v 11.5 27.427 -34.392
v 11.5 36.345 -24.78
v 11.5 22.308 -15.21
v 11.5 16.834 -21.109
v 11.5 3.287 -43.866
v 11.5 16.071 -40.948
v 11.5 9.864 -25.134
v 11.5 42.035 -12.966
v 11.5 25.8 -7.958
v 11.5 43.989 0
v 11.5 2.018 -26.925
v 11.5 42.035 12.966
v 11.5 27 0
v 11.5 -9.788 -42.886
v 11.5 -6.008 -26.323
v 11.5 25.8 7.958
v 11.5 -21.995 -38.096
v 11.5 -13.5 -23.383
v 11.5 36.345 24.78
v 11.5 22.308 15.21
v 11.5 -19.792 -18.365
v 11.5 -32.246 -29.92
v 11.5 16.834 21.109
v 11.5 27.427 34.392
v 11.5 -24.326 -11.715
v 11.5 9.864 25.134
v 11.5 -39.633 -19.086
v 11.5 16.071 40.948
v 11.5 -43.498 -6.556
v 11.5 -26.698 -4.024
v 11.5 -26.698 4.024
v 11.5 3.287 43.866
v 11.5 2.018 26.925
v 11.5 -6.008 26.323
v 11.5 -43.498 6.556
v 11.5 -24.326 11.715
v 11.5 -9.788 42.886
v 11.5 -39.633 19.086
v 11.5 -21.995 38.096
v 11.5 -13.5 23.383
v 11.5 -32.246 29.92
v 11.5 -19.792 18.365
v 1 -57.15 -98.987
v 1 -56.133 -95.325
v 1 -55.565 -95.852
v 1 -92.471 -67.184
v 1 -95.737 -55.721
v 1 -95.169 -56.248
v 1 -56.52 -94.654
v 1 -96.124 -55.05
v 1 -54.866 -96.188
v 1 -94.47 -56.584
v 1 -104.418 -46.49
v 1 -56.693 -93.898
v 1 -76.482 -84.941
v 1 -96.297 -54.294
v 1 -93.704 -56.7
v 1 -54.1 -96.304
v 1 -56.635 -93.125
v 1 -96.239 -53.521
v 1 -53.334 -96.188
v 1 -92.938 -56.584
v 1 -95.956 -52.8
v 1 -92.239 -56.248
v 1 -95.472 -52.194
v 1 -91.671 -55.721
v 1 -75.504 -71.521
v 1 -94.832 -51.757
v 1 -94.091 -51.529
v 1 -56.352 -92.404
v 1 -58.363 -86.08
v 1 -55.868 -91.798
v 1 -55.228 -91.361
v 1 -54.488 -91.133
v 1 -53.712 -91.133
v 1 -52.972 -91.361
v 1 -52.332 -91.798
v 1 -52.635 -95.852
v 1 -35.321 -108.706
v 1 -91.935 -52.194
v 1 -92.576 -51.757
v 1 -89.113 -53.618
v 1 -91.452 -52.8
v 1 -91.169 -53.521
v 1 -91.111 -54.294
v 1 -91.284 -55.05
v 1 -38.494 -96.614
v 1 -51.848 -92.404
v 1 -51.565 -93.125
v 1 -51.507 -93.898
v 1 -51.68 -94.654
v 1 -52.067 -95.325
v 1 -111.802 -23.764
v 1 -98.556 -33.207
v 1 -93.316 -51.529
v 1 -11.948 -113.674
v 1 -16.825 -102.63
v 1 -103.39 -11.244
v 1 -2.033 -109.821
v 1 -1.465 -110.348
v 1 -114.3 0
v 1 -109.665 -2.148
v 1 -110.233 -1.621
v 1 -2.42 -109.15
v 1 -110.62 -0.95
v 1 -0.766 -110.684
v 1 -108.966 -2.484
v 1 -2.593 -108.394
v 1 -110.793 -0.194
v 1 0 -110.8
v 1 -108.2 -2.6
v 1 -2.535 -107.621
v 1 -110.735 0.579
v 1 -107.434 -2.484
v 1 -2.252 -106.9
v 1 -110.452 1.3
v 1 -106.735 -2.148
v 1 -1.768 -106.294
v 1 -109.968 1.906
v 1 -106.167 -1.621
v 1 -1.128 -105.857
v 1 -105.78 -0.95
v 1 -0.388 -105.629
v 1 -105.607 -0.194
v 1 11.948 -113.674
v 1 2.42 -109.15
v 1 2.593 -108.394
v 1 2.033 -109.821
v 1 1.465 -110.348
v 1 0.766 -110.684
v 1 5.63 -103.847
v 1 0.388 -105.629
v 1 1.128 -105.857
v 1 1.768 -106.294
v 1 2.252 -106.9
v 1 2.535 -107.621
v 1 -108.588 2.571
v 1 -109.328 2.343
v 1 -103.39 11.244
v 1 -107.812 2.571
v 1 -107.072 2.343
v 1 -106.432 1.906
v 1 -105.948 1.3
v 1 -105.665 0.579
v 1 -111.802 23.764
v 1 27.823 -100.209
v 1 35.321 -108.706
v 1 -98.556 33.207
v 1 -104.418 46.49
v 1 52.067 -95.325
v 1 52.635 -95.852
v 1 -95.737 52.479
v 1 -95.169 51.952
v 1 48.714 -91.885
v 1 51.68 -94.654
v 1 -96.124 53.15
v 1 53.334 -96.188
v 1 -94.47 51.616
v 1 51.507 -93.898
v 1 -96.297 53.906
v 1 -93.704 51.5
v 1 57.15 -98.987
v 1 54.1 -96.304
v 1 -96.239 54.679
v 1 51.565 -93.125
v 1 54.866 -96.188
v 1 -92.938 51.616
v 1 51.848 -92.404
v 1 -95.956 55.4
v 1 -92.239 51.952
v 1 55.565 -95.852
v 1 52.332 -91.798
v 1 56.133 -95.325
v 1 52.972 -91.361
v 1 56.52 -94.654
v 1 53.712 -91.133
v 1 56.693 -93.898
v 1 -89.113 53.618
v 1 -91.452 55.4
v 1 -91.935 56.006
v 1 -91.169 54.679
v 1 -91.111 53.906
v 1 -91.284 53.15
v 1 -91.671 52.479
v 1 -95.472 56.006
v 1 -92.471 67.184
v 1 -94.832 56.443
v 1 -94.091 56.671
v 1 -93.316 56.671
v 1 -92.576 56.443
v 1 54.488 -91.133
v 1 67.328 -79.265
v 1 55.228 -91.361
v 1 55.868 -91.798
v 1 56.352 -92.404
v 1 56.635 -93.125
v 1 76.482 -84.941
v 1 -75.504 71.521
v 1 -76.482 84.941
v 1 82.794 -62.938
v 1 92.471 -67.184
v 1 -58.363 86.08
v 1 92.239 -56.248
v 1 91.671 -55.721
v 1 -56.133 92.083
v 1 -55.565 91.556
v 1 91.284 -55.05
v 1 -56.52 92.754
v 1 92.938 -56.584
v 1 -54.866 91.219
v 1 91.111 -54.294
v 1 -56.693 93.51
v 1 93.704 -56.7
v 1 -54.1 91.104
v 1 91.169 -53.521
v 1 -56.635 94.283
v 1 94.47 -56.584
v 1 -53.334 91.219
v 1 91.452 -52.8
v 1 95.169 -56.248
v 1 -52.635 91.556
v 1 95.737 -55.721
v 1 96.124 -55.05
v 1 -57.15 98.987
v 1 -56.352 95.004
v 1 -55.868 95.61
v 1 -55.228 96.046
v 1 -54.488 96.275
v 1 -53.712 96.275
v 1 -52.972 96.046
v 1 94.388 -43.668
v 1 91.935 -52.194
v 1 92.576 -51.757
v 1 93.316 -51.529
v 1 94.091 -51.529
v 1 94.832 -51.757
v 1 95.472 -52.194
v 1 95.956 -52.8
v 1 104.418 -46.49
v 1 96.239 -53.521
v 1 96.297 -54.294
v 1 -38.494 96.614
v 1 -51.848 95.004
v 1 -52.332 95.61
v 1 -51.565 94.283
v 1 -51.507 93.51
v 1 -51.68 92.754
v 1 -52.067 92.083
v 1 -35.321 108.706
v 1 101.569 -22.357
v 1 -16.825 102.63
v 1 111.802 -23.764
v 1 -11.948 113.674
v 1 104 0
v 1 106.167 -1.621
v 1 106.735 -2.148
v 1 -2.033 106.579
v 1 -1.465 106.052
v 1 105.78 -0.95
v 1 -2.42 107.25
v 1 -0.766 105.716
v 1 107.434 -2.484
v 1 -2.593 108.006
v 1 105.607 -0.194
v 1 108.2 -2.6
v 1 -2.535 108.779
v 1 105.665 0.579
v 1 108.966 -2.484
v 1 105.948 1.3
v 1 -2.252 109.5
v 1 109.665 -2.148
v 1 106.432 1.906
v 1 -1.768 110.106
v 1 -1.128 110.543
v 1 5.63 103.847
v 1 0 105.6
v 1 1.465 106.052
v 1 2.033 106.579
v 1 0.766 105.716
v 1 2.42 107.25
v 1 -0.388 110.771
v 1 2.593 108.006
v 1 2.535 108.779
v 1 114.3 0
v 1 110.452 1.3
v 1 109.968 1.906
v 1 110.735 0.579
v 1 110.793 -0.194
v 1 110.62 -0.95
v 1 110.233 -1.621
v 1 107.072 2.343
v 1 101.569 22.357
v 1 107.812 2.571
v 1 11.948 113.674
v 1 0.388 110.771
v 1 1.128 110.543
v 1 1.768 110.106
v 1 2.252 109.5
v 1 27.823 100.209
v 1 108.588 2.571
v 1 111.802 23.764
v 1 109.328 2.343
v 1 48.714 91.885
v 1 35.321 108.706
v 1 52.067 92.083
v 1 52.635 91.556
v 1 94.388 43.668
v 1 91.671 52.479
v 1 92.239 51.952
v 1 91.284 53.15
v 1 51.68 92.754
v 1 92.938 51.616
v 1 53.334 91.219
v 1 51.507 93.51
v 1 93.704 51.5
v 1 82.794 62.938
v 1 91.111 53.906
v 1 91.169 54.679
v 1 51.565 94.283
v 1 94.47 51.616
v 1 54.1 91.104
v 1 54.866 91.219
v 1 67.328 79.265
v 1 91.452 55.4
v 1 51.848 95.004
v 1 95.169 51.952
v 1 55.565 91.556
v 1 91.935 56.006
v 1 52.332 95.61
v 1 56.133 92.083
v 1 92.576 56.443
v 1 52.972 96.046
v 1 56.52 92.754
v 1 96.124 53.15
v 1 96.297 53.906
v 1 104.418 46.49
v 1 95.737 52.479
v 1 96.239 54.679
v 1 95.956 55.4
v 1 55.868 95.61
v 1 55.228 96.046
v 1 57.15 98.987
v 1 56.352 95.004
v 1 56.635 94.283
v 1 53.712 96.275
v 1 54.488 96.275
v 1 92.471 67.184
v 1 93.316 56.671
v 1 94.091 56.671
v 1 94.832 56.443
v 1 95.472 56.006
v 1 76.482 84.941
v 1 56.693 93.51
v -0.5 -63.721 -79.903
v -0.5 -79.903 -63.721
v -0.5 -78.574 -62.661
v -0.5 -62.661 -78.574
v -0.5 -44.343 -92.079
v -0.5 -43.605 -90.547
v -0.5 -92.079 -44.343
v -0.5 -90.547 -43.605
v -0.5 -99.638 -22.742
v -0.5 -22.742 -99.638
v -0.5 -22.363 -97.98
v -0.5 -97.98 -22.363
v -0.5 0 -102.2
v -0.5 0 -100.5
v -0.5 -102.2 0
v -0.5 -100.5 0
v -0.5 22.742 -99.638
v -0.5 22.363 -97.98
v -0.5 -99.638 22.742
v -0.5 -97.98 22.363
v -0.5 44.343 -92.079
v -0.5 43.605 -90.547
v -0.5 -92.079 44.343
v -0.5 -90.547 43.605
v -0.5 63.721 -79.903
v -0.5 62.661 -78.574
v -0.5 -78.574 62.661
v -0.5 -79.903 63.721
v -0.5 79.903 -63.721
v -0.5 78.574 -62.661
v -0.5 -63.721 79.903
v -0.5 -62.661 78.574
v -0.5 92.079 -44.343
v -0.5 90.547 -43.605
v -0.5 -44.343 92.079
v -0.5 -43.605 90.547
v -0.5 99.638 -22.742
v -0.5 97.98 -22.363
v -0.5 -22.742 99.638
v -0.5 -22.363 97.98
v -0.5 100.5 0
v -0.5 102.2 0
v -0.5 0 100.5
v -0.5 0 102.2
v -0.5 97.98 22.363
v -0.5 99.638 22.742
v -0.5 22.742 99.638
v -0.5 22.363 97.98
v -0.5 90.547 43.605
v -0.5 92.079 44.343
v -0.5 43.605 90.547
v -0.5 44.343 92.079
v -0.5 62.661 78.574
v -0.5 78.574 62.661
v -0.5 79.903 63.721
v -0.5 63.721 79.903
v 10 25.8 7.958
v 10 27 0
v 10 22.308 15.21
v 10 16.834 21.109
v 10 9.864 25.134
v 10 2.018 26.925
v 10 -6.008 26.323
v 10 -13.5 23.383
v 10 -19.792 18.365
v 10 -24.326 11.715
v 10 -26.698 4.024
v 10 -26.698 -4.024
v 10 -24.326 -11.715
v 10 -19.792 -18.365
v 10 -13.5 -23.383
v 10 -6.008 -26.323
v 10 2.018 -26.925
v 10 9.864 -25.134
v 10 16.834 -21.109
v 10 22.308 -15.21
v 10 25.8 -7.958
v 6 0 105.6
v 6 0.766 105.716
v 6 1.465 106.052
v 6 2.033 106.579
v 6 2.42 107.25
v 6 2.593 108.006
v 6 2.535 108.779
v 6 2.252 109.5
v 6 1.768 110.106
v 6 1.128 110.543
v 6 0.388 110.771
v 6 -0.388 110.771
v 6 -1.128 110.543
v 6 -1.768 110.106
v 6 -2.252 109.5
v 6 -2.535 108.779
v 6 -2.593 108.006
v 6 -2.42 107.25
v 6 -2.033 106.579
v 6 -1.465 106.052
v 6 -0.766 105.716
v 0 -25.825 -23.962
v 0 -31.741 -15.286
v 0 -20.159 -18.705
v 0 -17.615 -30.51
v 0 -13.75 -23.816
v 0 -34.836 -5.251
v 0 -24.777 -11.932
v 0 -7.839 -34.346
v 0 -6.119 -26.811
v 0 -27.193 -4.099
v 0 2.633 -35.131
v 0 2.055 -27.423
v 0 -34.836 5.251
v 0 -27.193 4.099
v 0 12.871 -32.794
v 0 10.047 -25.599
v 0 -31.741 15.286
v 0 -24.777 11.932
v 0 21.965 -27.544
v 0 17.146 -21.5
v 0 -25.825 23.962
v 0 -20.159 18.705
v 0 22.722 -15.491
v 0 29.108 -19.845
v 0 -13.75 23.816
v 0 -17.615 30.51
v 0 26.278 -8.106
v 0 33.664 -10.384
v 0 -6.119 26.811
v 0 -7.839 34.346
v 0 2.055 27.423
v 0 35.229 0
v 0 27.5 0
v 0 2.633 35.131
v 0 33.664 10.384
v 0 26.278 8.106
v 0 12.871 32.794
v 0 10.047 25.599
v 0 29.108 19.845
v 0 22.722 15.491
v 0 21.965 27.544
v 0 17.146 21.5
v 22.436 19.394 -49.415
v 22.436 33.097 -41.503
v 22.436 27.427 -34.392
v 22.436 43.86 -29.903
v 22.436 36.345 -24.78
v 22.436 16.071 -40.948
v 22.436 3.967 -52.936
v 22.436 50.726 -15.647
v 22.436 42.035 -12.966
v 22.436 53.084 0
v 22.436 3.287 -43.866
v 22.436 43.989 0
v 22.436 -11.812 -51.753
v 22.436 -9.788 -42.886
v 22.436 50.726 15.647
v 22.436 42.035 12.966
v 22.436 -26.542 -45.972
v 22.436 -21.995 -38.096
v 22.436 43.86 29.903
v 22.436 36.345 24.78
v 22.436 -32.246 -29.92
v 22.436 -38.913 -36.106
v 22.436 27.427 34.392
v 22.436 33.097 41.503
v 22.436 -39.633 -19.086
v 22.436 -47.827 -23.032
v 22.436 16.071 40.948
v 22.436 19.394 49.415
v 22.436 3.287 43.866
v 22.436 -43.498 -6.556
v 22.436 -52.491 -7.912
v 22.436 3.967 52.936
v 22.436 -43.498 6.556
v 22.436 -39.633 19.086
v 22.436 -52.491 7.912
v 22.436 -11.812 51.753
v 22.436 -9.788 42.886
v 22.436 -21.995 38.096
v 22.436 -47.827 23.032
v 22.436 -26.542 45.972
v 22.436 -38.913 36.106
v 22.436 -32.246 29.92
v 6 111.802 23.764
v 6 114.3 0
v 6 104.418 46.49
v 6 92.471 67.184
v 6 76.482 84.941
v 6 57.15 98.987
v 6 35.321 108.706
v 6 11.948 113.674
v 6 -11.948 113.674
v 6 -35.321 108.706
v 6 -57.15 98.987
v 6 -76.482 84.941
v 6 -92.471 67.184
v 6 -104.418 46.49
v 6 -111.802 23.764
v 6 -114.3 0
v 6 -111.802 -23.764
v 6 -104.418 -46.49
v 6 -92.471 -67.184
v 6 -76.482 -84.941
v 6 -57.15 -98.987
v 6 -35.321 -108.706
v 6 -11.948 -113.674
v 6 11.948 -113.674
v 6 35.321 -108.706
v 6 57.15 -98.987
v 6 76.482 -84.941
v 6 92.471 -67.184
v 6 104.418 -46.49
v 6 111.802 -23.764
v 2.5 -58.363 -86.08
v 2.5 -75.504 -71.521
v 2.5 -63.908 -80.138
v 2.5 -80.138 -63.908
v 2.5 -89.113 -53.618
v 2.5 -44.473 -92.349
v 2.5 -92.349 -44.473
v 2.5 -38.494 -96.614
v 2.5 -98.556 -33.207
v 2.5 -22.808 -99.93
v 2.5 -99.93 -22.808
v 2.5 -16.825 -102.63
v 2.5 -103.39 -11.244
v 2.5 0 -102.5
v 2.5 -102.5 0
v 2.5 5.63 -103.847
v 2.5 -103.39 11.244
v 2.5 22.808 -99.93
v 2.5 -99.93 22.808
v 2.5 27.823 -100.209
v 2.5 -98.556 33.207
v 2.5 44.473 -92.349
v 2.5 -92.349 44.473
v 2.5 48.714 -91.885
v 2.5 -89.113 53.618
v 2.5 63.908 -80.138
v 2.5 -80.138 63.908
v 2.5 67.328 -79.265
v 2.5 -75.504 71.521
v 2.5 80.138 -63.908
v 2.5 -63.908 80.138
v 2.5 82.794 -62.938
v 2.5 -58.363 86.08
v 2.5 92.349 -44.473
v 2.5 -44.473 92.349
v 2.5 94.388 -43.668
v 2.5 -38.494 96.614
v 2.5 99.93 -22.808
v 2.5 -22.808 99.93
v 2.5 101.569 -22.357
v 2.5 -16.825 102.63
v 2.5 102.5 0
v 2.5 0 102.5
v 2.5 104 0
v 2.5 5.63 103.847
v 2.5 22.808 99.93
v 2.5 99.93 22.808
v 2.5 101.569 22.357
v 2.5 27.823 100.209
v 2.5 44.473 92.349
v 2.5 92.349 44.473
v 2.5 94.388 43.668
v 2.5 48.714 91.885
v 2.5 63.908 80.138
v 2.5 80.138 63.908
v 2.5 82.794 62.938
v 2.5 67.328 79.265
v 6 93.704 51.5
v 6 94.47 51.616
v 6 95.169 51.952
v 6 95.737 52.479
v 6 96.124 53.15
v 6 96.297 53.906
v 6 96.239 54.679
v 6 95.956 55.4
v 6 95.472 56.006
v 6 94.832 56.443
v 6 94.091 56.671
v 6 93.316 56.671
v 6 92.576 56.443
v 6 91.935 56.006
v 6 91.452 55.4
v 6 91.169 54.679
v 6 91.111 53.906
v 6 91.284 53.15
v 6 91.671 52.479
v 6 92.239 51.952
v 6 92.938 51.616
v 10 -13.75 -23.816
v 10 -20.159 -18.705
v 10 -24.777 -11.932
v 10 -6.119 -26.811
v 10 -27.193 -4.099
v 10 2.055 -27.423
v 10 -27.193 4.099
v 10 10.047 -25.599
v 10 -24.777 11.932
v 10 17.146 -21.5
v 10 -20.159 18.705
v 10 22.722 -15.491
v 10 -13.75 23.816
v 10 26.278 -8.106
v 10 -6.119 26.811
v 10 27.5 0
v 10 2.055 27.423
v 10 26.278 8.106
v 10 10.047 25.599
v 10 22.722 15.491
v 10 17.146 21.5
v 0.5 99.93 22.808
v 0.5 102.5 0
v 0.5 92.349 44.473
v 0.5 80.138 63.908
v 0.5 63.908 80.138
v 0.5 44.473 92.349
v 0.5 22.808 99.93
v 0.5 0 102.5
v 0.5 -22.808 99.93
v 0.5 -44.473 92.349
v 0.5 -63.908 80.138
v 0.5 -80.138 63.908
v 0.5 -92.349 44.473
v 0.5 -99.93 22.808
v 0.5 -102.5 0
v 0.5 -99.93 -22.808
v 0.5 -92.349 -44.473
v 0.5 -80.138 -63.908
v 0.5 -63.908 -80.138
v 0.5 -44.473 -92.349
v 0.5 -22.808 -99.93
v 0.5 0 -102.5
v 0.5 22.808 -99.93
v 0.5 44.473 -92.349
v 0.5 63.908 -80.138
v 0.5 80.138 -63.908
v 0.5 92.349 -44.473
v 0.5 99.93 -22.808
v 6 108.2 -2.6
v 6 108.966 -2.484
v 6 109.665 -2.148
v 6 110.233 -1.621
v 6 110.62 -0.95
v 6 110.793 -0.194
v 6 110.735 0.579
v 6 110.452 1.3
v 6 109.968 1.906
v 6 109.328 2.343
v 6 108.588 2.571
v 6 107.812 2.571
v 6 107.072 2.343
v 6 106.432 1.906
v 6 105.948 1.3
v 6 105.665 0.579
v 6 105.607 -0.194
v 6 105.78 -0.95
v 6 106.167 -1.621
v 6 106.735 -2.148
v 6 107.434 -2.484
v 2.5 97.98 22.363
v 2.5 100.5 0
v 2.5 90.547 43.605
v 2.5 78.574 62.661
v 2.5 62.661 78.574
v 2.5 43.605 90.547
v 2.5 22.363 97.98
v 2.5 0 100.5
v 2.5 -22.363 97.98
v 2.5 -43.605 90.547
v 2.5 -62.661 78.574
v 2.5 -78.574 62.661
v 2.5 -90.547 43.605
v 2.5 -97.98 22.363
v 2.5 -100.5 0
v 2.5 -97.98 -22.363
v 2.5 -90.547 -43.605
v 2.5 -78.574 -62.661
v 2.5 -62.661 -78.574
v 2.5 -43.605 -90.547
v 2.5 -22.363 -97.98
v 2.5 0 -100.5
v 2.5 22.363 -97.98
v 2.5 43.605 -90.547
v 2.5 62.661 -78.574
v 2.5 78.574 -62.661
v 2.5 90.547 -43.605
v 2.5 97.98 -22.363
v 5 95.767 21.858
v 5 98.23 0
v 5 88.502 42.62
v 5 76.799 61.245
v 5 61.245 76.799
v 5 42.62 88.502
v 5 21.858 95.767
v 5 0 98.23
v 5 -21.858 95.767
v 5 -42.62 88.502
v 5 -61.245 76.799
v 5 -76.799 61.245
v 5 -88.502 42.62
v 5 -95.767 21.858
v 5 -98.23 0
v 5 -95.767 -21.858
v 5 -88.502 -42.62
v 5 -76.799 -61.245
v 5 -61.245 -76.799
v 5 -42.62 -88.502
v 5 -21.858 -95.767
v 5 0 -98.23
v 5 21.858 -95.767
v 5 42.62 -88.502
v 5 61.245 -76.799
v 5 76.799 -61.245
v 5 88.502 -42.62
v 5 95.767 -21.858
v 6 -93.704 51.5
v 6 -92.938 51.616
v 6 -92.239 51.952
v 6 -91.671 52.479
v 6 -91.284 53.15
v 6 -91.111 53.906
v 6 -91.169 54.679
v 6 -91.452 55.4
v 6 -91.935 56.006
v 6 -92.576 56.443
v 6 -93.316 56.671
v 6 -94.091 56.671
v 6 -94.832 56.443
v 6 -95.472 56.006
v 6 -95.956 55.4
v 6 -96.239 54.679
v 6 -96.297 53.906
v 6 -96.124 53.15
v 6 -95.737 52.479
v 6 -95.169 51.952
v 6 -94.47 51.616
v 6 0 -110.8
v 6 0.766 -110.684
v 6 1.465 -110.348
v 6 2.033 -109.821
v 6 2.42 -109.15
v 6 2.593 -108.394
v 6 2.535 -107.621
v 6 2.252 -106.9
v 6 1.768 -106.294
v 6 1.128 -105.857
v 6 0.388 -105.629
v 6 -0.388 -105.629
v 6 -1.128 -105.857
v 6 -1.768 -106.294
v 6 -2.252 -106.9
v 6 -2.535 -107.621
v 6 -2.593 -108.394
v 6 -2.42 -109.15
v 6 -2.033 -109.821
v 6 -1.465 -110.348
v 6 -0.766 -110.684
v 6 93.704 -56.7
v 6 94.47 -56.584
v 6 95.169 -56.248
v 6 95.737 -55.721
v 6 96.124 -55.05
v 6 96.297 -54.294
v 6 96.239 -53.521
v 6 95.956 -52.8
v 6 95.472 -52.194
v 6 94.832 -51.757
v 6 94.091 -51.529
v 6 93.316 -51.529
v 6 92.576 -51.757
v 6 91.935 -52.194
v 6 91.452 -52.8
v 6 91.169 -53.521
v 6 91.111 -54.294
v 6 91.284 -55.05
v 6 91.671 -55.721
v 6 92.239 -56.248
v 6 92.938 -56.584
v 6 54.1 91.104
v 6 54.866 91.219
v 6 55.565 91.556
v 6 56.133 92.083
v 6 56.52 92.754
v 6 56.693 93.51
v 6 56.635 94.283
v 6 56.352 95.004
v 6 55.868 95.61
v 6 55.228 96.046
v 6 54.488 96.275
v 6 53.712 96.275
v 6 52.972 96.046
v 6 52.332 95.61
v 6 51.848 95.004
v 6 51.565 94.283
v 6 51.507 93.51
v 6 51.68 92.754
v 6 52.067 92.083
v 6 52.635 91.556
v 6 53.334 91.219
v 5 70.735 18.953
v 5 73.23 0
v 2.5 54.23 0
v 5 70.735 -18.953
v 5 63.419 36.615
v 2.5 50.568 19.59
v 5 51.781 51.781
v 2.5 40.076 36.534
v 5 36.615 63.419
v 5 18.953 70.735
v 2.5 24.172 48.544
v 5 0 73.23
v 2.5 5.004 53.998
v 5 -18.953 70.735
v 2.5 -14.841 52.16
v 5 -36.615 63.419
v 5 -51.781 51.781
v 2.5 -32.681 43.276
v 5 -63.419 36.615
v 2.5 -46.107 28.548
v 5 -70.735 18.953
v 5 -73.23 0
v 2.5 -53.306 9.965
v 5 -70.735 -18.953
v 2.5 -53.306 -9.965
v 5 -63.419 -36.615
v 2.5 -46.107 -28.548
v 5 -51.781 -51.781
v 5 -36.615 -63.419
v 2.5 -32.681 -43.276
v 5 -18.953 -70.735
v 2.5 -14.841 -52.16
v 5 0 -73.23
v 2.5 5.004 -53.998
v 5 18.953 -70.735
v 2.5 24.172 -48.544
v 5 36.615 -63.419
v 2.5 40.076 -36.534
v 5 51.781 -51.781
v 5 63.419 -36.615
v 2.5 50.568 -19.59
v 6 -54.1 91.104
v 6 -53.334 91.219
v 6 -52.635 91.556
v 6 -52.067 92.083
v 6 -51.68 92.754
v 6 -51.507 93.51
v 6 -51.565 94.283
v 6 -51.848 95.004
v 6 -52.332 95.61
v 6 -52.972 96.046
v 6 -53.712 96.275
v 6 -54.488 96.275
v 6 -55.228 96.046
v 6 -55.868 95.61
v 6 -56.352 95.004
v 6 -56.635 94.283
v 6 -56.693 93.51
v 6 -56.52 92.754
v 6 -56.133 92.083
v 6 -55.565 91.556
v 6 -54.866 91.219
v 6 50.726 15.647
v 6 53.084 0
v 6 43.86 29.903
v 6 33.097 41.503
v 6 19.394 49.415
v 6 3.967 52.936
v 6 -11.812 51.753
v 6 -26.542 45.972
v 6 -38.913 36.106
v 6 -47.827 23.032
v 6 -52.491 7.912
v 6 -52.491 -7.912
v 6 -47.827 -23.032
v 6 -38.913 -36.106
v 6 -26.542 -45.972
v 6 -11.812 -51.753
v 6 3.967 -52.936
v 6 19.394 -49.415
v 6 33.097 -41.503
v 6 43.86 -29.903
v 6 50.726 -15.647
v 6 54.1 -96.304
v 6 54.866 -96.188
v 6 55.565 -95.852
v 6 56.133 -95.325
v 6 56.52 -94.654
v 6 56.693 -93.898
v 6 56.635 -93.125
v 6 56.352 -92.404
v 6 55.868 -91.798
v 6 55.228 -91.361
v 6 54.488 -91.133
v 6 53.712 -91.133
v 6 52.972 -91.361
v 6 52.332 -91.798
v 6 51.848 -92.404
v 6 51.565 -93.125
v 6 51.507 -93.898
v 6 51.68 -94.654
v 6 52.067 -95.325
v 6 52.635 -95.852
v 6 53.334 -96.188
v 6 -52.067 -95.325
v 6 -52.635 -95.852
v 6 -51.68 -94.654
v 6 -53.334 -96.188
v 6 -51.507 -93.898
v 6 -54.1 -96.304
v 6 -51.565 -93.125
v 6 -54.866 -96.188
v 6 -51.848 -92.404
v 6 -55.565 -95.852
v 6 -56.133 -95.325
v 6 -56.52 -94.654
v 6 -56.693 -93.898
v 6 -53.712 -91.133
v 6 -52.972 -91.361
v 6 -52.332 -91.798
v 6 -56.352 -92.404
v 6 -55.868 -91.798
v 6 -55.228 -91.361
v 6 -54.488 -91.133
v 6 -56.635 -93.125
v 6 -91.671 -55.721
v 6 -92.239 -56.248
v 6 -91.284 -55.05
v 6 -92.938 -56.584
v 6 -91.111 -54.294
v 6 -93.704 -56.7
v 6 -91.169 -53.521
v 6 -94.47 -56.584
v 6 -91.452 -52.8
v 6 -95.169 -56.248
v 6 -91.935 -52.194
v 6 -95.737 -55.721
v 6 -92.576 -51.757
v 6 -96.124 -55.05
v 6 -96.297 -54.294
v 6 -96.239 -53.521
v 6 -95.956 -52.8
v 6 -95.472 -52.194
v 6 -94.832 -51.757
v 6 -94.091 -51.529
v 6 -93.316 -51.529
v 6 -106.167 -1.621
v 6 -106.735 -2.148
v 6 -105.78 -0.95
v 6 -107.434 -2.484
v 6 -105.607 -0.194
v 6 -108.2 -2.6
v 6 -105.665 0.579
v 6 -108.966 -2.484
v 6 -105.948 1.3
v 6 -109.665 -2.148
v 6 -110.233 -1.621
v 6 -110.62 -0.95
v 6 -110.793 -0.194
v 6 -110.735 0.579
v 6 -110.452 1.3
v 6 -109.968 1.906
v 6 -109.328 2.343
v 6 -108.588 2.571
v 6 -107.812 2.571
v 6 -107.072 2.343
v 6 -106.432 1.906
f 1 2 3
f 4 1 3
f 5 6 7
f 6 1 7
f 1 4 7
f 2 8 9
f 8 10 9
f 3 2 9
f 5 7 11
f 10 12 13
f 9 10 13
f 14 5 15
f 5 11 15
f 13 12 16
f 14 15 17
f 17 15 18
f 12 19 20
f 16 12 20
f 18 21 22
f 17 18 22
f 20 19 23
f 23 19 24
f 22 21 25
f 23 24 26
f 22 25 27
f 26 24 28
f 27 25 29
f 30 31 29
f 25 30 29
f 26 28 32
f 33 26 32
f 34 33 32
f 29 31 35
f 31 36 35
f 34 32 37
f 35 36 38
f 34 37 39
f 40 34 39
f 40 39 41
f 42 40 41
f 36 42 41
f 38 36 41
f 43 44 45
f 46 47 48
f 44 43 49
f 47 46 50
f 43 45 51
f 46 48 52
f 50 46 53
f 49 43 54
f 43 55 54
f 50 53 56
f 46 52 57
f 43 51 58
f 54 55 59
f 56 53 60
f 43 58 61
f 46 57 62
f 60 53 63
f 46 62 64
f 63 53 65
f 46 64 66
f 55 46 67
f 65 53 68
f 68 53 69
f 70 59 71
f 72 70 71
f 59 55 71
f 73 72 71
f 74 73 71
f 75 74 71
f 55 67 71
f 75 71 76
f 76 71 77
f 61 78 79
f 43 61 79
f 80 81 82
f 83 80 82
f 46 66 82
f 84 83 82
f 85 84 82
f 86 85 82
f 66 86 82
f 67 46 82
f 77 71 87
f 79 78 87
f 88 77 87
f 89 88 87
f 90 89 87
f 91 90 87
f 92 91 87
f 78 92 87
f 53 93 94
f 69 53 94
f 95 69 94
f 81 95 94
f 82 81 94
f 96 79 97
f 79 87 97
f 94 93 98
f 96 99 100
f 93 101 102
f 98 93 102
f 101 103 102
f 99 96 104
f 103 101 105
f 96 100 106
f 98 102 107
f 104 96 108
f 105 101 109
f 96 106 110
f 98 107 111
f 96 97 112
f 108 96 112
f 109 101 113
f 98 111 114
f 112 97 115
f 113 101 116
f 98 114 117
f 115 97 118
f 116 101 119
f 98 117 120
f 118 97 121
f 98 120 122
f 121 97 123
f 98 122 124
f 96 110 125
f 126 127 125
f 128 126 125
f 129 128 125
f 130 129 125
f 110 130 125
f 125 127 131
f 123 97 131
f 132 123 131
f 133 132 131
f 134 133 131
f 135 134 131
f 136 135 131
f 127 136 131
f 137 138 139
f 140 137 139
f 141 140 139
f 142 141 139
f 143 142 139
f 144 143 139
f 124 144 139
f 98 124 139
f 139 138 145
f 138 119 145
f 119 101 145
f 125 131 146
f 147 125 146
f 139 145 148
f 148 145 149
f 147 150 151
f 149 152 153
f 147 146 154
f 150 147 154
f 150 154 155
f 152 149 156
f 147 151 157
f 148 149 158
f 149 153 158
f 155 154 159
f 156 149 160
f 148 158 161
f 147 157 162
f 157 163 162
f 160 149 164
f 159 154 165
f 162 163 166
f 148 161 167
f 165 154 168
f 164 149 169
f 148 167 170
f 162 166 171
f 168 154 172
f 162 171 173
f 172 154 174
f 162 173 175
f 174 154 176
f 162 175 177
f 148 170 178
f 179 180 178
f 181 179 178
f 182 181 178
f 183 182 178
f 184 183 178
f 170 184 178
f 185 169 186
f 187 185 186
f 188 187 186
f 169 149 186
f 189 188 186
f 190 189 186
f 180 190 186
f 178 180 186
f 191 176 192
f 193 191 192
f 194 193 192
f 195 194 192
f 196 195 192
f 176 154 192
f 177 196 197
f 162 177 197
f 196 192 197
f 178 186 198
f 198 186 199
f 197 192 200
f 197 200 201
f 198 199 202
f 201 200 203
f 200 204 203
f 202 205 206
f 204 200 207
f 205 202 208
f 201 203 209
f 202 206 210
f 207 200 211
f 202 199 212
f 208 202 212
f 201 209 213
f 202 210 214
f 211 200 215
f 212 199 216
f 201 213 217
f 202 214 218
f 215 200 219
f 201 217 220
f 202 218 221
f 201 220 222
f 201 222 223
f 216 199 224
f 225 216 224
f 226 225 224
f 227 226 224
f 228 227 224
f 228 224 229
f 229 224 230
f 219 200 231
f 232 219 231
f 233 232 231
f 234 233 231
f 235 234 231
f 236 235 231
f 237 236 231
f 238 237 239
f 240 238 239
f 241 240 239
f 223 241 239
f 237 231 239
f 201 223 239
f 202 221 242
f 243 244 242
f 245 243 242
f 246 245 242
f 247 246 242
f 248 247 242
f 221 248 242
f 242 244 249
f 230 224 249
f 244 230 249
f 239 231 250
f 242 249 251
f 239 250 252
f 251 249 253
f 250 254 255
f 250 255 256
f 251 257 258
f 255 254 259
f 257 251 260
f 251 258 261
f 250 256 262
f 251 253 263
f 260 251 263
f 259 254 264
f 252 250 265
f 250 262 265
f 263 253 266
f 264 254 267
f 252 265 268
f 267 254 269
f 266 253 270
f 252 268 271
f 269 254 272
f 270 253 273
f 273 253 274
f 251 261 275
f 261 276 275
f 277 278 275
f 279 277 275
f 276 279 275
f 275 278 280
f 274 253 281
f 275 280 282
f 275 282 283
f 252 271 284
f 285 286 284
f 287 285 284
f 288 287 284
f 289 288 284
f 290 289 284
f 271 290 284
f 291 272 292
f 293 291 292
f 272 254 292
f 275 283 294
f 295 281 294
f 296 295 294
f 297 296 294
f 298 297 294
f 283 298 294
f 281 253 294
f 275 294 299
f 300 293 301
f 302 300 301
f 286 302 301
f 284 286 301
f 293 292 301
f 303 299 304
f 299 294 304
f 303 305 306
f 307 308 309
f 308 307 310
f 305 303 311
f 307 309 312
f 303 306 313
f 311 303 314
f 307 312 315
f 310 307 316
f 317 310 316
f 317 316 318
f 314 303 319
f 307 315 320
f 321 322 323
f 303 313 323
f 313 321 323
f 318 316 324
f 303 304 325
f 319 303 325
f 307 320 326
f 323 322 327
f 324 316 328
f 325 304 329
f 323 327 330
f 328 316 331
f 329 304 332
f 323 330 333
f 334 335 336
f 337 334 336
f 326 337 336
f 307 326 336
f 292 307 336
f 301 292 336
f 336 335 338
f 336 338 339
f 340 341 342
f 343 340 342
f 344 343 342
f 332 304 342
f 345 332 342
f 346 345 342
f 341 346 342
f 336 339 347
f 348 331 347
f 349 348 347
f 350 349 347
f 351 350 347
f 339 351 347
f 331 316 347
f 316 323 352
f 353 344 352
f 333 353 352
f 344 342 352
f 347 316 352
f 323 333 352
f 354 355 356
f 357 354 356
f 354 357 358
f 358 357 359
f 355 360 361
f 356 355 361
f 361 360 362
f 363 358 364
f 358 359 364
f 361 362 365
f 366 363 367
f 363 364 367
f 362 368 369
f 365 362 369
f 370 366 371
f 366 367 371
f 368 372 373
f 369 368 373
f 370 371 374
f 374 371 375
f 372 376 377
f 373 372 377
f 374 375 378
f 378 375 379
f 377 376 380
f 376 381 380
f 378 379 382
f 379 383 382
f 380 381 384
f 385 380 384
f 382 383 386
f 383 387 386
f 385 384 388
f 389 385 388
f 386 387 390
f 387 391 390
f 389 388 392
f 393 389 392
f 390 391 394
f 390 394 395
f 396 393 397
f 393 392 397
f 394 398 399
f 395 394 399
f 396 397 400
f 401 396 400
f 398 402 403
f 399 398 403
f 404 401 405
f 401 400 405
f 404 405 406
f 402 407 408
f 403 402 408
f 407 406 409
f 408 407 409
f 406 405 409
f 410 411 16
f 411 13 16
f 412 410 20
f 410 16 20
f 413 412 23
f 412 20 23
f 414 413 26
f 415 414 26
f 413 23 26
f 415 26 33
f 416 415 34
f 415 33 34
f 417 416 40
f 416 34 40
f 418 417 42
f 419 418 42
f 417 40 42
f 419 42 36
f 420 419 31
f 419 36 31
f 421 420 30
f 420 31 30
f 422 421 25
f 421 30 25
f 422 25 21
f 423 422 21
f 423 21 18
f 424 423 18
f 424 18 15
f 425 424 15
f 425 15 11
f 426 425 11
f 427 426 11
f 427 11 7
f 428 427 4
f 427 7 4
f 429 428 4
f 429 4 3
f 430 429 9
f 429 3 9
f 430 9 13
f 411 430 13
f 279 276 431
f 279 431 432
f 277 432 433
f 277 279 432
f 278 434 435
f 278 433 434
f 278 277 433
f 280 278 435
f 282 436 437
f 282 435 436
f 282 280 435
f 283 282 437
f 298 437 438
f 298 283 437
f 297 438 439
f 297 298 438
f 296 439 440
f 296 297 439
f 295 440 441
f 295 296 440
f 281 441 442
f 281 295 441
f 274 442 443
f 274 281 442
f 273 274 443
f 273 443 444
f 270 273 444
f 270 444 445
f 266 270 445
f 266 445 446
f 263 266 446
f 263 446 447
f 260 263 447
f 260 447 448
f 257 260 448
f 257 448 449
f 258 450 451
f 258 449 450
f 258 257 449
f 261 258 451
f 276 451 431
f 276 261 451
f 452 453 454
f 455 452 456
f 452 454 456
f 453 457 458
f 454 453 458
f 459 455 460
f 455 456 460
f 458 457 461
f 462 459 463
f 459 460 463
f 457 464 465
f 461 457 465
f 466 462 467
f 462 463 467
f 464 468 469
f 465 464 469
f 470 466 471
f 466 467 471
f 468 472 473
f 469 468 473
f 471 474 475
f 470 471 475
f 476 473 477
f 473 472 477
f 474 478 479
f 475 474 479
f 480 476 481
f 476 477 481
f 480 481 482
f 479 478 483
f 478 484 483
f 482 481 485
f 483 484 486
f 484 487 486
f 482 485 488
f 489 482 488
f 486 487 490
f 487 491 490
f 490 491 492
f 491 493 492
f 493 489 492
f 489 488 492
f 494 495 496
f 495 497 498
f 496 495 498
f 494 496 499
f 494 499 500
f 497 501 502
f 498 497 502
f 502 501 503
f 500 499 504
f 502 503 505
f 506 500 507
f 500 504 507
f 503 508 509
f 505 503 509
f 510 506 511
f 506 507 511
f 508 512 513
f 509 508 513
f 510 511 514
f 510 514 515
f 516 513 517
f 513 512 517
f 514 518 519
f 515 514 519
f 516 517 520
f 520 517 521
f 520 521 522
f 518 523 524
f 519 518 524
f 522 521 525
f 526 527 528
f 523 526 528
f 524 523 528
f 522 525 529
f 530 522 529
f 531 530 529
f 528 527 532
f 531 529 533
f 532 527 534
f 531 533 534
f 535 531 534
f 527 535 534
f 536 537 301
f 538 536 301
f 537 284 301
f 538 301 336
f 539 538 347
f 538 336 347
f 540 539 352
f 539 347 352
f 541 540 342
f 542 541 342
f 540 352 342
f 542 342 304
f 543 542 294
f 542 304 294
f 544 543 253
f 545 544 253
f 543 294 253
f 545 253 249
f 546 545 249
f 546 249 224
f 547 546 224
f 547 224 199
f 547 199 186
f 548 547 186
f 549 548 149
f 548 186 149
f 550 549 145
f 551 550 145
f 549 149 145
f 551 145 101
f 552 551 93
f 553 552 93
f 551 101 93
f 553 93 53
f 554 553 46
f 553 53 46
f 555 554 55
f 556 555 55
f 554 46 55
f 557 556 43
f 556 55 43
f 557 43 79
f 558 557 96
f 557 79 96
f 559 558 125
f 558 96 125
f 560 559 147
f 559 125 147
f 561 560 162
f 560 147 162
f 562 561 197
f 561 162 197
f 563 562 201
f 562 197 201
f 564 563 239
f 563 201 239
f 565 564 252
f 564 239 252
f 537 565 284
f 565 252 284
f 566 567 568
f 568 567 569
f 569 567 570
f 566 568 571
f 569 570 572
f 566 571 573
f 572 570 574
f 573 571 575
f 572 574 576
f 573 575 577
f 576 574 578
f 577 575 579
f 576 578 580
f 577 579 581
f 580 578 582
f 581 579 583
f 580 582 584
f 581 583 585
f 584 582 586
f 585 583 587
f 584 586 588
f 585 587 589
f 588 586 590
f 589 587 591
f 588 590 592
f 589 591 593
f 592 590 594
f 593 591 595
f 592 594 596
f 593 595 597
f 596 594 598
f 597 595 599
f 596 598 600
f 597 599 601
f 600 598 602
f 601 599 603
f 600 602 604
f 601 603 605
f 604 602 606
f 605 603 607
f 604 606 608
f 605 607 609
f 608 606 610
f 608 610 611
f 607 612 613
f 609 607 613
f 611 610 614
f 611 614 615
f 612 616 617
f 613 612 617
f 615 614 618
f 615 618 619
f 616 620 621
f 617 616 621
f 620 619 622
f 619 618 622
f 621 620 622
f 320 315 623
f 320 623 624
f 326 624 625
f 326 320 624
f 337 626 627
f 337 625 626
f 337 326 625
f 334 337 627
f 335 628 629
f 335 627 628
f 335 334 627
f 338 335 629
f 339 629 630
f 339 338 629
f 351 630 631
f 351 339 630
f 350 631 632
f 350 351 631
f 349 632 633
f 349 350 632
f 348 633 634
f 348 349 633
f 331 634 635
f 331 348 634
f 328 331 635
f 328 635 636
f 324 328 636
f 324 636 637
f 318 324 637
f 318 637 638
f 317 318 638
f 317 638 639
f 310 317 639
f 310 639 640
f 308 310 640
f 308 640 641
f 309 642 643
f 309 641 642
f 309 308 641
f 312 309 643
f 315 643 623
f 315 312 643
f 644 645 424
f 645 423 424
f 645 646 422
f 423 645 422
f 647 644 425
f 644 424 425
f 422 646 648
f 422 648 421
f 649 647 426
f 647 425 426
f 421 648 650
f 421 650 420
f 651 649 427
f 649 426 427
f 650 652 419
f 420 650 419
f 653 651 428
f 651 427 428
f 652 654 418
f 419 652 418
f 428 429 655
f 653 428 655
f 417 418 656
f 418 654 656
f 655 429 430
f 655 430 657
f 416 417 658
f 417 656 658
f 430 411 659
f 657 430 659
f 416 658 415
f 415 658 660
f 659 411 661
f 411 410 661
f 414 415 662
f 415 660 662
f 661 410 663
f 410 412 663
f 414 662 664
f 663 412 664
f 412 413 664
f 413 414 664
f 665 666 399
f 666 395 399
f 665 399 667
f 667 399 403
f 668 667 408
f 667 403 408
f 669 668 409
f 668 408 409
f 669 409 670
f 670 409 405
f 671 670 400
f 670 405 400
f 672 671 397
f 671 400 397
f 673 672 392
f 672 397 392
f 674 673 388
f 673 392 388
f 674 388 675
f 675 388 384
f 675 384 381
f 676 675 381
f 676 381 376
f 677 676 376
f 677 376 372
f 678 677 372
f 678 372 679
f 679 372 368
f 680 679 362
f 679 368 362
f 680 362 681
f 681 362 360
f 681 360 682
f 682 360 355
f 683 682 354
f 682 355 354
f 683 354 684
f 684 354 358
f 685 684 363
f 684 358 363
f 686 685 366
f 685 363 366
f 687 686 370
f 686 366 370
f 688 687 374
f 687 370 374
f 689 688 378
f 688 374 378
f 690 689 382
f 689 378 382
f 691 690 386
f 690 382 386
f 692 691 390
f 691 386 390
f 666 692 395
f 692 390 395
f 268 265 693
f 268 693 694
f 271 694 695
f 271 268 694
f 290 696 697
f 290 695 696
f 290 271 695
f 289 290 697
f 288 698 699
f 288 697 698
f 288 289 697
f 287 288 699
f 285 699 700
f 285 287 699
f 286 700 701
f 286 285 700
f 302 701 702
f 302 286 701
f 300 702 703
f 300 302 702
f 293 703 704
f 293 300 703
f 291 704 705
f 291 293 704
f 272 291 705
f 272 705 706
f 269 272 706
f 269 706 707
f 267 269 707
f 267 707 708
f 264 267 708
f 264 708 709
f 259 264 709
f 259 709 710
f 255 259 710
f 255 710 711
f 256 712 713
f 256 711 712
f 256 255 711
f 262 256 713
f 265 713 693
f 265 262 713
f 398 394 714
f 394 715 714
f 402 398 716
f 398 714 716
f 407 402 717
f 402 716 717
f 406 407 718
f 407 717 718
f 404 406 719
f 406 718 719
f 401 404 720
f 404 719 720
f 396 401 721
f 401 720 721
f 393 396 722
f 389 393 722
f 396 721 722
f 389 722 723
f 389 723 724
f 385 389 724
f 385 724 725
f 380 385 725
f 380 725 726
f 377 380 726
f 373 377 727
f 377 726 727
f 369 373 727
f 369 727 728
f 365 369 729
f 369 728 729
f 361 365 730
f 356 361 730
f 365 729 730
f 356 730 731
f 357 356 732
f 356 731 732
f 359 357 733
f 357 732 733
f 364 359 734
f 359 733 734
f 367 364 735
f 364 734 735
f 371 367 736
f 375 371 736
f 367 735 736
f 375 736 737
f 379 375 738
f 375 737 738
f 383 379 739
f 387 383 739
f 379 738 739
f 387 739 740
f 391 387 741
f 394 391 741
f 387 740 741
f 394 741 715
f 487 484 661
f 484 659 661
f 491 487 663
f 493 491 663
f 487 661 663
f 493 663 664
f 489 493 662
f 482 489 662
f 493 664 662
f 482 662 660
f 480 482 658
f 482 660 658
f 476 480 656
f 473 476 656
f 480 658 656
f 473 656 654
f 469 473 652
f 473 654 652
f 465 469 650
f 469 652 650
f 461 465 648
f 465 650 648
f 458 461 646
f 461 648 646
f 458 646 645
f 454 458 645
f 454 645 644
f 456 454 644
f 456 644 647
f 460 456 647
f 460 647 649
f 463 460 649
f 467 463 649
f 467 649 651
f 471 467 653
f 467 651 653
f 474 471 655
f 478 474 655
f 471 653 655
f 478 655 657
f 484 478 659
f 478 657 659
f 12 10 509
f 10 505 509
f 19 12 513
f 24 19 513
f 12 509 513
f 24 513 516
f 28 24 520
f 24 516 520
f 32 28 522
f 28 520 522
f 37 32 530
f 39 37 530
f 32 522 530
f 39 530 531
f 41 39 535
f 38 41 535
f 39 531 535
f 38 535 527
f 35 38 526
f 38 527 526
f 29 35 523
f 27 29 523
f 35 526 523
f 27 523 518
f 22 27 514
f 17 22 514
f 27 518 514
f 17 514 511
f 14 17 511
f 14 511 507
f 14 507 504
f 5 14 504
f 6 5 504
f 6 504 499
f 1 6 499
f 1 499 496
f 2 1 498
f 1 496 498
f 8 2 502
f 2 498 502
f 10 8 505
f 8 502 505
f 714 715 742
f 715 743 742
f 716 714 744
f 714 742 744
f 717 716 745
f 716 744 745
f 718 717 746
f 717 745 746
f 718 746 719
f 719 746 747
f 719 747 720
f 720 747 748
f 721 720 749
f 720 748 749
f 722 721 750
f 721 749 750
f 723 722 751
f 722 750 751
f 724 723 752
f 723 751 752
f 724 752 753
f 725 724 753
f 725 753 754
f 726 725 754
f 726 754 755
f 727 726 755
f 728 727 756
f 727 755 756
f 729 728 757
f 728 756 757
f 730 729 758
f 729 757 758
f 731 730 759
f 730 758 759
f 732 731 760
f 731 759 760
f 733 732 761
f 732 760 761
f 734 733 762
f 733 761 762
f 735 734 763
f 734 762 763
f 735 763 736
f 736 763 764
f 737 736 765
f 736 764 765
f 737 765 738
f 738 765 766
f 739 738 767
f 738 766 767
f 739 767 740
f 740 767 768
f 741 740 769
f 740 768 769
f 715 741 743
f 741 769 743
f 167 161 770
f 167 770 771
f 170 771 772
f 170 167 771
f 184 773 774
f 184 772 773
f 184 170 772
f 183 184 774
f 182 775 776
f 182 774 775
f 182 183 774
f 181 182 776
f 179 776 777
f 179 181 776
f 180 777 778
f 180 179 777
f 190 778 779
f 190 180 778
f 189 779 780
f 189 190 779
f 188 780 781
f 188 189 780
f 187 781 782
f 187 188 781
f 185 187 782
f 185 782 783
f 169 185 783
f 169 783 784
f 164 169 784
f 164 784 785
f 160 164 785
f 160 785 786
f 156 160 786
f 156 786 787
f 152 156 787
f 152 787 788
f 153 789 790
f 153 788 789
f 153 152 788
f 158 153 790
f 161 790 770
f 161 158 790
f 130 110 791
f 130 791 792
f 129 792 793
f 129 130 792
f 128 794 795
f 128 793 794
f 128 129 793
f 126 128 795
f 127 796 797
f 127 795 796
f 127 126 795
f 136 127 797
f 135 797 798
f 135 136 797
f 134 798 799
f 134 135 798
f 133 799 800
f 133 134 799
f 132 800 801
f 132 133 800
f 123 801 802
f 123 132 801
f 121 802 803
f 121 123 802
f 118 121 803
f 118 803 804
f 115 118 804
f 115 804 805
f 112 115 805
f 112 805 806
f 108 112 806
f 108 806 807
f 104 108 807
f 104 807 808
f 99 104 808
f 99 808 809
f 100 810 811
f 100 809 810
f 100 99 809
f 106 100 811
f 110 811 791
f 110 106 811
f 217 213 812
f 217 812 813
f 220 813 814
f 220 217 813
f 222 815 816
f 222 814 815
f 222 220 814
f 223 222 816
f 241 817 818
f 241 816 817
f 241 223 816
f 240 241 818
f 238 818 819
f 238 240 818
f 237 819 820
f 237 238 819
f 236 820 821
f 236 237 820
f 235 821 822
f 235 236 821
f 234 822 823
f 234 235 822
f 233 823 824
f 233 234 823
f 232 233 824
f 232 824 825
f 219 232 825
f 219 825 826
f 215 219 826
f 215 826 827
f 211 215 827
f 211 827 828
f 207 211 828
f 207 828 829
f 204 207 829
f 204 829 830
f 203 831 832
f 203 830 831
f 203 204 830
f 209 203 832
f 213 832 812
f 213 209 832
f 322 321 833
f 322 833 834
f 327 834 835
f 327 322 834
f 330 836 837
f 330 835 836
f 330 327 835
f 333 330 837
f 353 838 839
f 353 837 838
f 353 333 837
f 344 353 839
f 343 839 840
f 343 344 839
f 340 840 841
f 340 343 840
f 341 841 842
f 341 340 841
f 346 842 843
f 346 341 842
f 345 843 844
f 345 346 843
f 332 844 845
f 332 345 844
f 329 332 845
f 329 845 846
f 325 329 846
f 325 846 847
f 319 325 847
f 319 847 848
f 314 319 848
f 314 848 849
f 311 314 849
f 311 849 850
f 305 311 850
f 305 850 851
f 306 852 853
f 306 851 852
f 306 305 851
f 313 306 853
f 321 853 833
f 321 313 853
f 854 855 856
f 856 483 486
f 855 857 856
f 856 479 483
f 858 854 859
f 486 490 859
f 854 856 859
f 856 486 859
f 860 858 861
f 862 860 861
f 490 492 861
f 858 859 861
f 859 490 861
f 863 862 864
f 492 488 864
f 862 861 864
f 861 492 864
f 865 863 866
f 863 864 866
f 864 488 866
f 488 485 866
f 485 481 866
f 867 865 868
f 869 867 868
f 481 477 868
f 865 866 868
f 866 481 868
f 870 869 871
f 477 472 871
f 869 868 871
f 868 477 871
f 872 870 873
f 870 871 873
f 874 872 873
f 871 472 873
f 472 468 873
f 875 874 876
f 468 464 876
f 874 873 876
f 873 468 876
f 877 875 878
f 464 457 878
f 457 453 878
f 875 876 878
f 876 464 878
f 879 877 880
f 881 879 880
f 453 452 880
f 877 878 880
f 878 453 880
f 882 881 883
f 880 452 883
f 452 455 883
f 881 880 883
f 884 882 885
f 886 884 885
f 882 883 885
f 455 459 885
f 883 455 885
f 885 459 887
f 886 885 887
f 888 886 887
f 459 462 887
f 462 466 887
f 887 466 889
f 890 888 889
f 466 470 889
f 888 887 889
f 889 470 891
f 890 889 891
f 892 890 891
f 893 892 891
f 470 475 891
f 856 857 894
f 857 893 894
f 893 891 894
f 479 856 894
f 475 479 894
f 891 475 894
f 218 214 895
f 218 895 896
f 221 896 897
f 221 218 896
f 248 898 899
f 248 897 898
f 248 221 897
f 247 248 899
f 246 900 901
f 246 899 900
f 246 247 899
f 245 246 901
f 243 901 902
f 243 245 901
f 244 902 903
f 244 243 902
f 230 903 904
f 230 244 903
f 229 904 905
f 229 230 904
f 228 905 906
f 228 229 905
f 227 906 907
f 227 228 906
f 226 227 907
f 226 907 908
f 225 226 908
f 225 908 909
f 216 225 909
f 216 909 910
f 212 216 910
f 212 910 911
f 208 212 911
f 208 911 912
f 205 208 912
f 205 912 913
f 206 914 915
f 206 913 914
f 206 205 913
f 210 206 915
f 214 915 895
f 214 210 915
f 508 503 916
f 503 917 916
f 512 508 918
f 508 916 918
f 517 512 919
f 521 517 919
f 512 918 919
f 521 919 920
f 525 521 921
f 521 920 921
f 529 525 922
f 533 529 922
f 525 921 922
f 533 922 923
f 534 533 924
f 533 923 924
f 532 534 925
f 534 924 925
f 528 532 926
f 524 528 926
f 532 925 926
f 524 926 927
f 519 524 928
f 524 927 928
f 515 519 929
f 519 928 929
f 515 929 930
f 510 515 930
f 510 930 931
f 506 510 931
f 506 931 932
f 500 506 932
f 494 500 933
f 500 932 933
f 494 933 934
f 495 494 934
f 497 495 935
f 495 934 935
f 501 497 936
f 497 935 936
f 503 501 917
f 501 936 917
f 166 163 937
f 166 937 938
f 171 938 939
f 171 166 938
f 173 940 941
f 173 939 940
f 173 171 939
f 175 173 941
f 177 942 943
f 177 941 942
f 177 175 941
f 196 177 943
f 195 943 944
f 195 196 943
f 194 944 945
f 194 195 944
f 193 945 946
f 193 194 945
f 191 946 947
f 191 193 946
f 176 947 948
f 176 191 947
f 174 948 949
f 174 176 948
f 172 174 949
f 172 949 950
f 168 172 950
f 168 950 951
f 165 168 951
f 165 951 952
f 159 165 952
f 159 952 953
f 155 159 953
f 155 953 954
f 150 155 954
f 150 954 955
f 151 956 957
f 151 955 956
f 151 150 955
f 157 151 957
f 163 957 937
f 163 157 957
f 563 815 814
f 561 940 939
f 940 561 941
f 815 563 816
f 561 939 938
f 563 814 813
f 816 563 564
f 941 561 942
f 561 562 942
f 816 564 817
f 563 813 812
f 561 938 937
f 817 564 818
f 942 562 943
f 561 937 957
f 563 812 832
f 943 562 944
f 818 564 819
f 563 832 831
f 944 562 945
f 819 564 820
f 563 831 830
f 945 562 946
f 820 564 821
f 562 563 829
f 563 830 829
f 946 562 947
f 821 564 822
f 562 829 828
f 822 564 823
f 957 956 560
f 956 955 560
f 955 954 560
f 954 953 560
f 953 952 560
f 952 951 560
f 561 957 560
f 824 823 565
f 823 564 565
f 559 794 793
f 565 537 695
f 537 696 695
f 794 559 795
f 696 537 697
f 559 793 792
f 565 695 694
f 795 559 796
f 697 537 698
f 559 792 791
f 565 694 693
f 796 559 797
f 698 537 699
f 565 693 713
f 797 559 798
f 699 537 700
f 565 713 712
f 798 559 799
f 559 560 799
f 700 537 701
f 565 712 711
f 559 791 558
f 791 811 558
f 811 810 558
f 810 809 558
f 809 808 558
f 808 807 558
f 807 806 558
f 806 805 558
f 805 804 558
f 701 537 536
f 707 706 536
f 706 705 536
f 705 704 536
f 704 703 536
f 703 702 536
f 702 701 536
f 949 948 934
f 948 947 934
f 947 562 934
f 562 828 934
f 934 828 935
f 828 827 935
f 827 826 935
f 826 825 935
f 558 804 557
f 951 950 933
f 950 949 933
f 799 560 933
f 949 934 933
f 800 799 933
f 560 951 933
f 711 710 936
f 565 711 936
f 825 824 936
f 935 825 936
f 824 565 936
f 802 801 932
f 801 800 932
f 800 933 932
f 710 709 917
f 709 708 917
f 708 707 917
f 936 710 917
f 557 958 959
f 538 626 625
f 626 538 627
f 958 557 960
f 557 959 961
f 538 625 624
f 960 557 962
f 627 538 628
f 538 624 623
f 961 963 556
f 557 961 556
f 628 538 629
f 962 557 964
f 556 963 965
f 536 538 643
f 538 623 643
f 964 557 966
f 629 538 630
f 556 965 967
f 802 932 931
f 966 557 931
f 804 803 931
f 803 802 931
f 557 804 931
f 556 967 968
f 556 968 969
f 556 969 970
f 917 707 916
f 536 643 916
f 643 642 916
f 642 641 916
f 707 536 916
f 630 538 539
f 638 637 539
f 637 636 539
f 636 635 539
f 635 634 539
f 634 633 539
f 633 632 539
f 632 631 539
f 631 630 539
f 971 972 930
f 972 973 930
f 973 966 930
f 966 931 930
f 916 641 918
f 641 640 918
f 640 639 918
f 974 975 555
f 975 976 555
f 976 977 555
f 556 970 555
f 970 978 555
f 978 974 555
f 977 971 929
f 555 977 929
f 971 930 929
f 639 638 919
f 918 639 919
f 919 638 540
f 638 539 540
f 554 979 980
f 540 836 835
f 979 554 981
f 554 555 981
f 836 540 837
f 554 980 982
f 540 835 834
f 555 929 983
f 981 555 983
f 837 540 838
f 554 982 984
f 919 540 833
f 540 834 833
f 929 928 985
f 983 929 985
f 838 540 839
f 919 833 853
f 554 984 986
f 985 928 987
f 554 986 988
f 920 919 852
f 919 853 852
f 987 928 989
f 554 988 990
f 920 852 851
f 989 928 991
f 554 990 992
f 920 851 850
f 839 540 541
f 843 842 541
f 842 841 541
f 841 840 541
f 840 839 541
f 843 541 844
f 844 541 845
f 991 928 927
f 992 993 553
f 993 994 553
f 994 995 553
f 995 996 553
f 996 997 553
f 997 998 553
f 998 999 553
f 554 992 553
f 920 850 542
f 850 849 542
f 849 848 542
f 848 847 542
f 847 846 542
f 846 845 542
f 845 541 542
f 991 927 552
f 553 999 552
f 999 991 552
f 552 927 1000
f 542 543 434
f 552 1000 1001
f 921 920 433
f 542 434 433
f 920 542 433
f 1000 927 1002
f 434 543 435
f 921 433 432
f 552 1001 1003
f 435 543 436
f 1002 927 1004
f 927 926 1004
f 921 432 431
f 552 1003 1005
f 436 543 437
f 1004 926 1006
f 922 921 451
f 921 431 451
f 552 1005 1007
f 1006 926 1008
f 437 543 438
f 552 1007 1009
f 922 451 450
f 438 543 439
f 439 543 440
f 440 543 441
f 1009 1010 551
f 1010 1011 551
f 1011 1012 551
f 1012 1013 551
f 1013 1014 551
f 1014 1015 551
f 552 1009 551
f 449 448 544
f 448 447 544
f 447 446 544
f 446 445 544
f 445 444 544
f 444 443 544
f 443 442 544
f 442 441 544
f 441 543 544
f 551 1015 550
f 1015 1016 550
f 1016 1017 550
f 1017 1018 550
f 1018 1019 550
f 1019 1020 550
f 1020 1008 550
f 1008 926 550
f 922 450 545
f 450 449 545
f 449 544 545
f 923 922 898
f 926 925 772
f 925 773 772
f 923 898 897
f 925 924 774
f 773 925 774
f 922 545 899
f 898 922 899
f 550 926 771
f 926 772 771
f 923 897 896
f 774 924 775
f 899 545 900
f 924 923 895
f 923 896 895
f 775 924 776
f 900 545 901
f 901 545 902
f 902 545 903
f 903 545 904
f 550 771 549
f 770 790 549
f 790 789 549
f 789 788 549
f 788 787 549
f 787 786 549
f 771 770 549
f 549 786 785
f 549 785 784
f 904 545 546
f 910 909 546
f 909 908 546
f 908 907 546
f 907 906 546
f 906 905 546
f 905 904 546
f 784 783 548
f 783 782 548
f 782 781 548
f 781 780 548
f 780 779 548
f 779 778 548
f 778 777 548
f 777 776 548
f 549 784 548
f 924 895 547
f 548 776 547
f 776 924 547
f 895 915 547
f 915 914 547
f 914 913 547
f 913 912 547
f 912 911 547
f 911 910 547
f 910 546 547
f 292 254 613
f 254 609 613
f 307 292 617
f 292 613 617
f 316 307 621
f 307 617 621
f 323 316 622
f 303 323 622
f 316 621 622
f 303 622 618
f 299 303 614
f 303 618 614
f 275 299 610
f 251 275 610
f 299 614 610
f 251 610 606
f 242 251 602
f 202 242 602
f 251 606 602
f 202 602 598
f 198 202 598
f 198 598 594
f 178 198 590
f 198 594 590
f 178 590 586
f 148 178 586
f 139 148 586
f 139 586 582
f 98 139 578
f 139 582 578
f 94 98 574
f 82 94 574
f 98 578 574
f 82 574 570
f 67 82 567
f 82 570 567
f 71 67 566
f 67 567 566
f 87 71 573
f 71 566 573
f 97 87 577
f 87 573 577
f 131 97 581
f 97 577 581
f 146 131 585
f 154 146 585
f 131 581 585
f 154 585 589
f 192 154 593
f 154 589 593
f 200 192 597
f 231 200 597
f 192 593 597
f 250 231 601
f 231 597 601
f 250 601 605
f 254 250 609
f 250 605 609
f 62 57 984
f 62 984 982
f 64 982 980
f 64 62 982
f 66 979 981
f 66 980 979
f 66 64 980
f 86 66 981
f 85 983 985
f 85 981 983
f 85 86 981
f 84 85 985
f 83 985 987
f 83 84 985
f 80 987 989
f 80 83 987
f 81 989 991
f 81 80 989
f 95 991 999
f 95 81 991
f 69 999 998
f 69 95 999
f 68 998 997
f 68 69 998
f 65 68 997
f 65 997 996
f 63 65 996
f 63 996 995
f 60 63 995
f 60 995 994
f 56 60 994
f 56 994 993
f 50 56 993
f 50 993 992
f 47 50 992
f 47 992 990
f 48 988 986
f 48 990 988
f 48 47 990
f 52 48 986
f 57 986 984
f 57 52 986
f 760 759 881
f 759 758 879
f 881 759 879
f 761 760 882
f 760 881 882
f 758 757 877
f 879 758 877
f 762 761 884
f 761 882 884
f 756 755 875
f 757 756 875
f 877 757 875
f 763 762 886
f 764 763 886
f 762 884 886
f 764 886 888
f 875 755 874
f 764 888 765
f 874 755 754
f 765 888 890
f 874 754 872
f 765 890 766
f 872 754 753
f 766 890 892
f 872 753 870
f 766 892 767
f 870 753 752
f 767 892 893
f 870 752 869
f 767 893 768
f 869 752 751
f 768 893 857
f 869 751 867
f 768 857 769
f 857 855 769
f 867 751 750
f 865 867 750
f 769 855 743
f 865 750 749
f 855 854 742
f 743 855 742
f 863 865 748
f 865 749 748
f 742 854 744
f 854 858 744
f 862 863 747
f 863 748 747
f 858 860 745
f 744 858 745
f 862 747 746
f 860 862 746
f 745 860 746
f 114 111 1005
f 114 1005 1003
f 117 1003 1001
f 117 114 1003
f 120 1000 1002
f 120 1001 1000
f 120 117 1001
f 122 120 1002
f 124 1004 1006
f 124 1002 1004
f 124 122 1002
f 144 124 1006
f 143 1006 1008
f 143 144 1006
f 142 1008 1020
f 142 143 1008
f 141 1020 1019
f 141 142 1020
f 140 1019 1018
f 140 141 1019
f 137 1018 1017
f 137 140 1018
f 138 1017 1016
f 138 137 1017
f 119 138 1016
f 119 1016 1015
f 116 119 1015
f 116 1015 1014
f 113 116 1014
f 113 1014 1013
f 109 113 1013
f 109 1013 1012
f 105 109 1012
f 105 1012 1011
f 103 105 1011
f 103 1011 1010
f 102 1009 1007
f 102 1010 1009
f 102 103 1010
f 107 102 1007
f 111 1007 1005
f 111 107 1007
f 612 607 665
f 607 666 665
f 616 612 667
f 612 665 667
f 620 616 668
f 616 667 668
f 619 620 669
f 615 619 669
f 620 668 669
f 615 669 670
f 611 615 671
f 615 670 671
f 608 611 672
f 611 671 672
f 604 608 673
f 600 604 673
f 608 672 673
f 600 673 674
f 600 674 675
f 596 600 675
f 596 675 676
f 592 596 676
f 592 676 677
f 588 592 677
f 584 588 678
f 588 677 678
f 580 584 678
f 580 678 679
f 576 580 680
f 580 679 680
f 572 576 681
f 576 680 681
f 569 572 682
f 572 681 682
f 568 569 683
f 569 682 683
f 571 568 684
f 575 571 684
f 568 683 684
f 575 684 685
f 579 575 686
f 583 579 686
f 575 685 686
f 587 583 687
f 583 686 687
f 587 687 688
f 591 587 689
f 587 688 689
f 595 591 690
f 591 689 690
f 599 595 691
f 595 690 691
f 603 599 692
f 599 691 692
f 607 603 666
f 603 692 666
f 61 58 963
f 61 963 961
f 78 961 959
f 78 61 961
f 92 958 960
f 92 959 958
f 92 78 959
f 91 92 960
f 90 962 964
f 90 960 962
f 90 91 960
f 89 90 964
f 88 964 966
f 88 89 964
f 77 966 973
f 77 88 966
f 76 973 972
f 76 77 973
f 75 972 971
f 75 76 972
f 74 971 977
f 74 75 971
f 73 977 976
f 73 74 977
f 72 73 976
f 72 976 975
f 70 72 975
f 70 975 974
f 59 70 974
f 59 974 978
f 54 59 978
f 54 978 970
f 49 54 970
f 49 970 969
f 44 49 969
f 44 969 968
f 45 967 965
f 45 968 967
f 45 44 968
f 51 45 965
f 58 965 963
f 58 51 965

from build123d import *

# Parameters (mm, degrees)
SKETCH2_R          = 2.6
CUT_EXTRUDE1_DEPTH = 10


with BuildPart() as part:
    # Sketch1 → Revolve1 (revolve)
    with BuildSketch(Plane.XY):
        Polygon((0, 27.5), (10, 27.5), (10, 27), (11.5, 27), (11.5, 43.989032899), (22.436374316, 43.989032899), (22.436374316, 53.08402355), (6, 53.08402355), (6, 114.3), (1, 114.3), (1, 104), (2.5, 104), (2.5, 102.5), (0.5, 102.5), (-0.5, 102.2), (-0.5, 100.5), (2.5, 100.5), (5, 98.23), (5, 73.23), (0, 35.229488808), align=None)
    revolve(axis=Axis((0, 0, 0), (1, 0, 0)))

    # Sketch2 → Cut-Extrude1 (cut)
    with BuildSketch(Plane(origin=(0, 0, 0), x_dir=(0, 0, -1), z_dir=(1, 0, 0))):
        with Locations((0, 108.2)):
            Circle(SKETCH2_R)
        with Locations((54.1, 93.703948689)):
            Circle(SKETCH2_R)
        with Locations((93.703948689, 54.1)):
            Circle(SKETCH2_R)
        with Locations((108.2, 0)):
            Circle(SKETCH2_R)
        with Locations((93.703948689, -54.1)):
            Circle(SKETCH2_R)
        with Locations((54.1, -93.703948689)):
            Circle(SKETCH2_R)
        with Locations((0, -108.2)):
            Circle(SKETCH2_R)
        with Locations((-54.1, -93.703948689)):
            Circle(SKETCH2_R)
        with Locations((-93.703948689, -54.1)):
            Circle(SKETCH2_R)
        with Locations((-108.2, 0)):
            Circle(SKETCH2_R)
        with Locations((-93.703948689, 54.1)):
            Circle(SKETCH2_R)
        with Locations((-54.1, 93.703948689)):
            Circle(SKETCH2_R)
    extrude(amount=CUT_EXTRUDE1_DEPTH, mode=Mode.SUBTRACT)


solid = part.part
